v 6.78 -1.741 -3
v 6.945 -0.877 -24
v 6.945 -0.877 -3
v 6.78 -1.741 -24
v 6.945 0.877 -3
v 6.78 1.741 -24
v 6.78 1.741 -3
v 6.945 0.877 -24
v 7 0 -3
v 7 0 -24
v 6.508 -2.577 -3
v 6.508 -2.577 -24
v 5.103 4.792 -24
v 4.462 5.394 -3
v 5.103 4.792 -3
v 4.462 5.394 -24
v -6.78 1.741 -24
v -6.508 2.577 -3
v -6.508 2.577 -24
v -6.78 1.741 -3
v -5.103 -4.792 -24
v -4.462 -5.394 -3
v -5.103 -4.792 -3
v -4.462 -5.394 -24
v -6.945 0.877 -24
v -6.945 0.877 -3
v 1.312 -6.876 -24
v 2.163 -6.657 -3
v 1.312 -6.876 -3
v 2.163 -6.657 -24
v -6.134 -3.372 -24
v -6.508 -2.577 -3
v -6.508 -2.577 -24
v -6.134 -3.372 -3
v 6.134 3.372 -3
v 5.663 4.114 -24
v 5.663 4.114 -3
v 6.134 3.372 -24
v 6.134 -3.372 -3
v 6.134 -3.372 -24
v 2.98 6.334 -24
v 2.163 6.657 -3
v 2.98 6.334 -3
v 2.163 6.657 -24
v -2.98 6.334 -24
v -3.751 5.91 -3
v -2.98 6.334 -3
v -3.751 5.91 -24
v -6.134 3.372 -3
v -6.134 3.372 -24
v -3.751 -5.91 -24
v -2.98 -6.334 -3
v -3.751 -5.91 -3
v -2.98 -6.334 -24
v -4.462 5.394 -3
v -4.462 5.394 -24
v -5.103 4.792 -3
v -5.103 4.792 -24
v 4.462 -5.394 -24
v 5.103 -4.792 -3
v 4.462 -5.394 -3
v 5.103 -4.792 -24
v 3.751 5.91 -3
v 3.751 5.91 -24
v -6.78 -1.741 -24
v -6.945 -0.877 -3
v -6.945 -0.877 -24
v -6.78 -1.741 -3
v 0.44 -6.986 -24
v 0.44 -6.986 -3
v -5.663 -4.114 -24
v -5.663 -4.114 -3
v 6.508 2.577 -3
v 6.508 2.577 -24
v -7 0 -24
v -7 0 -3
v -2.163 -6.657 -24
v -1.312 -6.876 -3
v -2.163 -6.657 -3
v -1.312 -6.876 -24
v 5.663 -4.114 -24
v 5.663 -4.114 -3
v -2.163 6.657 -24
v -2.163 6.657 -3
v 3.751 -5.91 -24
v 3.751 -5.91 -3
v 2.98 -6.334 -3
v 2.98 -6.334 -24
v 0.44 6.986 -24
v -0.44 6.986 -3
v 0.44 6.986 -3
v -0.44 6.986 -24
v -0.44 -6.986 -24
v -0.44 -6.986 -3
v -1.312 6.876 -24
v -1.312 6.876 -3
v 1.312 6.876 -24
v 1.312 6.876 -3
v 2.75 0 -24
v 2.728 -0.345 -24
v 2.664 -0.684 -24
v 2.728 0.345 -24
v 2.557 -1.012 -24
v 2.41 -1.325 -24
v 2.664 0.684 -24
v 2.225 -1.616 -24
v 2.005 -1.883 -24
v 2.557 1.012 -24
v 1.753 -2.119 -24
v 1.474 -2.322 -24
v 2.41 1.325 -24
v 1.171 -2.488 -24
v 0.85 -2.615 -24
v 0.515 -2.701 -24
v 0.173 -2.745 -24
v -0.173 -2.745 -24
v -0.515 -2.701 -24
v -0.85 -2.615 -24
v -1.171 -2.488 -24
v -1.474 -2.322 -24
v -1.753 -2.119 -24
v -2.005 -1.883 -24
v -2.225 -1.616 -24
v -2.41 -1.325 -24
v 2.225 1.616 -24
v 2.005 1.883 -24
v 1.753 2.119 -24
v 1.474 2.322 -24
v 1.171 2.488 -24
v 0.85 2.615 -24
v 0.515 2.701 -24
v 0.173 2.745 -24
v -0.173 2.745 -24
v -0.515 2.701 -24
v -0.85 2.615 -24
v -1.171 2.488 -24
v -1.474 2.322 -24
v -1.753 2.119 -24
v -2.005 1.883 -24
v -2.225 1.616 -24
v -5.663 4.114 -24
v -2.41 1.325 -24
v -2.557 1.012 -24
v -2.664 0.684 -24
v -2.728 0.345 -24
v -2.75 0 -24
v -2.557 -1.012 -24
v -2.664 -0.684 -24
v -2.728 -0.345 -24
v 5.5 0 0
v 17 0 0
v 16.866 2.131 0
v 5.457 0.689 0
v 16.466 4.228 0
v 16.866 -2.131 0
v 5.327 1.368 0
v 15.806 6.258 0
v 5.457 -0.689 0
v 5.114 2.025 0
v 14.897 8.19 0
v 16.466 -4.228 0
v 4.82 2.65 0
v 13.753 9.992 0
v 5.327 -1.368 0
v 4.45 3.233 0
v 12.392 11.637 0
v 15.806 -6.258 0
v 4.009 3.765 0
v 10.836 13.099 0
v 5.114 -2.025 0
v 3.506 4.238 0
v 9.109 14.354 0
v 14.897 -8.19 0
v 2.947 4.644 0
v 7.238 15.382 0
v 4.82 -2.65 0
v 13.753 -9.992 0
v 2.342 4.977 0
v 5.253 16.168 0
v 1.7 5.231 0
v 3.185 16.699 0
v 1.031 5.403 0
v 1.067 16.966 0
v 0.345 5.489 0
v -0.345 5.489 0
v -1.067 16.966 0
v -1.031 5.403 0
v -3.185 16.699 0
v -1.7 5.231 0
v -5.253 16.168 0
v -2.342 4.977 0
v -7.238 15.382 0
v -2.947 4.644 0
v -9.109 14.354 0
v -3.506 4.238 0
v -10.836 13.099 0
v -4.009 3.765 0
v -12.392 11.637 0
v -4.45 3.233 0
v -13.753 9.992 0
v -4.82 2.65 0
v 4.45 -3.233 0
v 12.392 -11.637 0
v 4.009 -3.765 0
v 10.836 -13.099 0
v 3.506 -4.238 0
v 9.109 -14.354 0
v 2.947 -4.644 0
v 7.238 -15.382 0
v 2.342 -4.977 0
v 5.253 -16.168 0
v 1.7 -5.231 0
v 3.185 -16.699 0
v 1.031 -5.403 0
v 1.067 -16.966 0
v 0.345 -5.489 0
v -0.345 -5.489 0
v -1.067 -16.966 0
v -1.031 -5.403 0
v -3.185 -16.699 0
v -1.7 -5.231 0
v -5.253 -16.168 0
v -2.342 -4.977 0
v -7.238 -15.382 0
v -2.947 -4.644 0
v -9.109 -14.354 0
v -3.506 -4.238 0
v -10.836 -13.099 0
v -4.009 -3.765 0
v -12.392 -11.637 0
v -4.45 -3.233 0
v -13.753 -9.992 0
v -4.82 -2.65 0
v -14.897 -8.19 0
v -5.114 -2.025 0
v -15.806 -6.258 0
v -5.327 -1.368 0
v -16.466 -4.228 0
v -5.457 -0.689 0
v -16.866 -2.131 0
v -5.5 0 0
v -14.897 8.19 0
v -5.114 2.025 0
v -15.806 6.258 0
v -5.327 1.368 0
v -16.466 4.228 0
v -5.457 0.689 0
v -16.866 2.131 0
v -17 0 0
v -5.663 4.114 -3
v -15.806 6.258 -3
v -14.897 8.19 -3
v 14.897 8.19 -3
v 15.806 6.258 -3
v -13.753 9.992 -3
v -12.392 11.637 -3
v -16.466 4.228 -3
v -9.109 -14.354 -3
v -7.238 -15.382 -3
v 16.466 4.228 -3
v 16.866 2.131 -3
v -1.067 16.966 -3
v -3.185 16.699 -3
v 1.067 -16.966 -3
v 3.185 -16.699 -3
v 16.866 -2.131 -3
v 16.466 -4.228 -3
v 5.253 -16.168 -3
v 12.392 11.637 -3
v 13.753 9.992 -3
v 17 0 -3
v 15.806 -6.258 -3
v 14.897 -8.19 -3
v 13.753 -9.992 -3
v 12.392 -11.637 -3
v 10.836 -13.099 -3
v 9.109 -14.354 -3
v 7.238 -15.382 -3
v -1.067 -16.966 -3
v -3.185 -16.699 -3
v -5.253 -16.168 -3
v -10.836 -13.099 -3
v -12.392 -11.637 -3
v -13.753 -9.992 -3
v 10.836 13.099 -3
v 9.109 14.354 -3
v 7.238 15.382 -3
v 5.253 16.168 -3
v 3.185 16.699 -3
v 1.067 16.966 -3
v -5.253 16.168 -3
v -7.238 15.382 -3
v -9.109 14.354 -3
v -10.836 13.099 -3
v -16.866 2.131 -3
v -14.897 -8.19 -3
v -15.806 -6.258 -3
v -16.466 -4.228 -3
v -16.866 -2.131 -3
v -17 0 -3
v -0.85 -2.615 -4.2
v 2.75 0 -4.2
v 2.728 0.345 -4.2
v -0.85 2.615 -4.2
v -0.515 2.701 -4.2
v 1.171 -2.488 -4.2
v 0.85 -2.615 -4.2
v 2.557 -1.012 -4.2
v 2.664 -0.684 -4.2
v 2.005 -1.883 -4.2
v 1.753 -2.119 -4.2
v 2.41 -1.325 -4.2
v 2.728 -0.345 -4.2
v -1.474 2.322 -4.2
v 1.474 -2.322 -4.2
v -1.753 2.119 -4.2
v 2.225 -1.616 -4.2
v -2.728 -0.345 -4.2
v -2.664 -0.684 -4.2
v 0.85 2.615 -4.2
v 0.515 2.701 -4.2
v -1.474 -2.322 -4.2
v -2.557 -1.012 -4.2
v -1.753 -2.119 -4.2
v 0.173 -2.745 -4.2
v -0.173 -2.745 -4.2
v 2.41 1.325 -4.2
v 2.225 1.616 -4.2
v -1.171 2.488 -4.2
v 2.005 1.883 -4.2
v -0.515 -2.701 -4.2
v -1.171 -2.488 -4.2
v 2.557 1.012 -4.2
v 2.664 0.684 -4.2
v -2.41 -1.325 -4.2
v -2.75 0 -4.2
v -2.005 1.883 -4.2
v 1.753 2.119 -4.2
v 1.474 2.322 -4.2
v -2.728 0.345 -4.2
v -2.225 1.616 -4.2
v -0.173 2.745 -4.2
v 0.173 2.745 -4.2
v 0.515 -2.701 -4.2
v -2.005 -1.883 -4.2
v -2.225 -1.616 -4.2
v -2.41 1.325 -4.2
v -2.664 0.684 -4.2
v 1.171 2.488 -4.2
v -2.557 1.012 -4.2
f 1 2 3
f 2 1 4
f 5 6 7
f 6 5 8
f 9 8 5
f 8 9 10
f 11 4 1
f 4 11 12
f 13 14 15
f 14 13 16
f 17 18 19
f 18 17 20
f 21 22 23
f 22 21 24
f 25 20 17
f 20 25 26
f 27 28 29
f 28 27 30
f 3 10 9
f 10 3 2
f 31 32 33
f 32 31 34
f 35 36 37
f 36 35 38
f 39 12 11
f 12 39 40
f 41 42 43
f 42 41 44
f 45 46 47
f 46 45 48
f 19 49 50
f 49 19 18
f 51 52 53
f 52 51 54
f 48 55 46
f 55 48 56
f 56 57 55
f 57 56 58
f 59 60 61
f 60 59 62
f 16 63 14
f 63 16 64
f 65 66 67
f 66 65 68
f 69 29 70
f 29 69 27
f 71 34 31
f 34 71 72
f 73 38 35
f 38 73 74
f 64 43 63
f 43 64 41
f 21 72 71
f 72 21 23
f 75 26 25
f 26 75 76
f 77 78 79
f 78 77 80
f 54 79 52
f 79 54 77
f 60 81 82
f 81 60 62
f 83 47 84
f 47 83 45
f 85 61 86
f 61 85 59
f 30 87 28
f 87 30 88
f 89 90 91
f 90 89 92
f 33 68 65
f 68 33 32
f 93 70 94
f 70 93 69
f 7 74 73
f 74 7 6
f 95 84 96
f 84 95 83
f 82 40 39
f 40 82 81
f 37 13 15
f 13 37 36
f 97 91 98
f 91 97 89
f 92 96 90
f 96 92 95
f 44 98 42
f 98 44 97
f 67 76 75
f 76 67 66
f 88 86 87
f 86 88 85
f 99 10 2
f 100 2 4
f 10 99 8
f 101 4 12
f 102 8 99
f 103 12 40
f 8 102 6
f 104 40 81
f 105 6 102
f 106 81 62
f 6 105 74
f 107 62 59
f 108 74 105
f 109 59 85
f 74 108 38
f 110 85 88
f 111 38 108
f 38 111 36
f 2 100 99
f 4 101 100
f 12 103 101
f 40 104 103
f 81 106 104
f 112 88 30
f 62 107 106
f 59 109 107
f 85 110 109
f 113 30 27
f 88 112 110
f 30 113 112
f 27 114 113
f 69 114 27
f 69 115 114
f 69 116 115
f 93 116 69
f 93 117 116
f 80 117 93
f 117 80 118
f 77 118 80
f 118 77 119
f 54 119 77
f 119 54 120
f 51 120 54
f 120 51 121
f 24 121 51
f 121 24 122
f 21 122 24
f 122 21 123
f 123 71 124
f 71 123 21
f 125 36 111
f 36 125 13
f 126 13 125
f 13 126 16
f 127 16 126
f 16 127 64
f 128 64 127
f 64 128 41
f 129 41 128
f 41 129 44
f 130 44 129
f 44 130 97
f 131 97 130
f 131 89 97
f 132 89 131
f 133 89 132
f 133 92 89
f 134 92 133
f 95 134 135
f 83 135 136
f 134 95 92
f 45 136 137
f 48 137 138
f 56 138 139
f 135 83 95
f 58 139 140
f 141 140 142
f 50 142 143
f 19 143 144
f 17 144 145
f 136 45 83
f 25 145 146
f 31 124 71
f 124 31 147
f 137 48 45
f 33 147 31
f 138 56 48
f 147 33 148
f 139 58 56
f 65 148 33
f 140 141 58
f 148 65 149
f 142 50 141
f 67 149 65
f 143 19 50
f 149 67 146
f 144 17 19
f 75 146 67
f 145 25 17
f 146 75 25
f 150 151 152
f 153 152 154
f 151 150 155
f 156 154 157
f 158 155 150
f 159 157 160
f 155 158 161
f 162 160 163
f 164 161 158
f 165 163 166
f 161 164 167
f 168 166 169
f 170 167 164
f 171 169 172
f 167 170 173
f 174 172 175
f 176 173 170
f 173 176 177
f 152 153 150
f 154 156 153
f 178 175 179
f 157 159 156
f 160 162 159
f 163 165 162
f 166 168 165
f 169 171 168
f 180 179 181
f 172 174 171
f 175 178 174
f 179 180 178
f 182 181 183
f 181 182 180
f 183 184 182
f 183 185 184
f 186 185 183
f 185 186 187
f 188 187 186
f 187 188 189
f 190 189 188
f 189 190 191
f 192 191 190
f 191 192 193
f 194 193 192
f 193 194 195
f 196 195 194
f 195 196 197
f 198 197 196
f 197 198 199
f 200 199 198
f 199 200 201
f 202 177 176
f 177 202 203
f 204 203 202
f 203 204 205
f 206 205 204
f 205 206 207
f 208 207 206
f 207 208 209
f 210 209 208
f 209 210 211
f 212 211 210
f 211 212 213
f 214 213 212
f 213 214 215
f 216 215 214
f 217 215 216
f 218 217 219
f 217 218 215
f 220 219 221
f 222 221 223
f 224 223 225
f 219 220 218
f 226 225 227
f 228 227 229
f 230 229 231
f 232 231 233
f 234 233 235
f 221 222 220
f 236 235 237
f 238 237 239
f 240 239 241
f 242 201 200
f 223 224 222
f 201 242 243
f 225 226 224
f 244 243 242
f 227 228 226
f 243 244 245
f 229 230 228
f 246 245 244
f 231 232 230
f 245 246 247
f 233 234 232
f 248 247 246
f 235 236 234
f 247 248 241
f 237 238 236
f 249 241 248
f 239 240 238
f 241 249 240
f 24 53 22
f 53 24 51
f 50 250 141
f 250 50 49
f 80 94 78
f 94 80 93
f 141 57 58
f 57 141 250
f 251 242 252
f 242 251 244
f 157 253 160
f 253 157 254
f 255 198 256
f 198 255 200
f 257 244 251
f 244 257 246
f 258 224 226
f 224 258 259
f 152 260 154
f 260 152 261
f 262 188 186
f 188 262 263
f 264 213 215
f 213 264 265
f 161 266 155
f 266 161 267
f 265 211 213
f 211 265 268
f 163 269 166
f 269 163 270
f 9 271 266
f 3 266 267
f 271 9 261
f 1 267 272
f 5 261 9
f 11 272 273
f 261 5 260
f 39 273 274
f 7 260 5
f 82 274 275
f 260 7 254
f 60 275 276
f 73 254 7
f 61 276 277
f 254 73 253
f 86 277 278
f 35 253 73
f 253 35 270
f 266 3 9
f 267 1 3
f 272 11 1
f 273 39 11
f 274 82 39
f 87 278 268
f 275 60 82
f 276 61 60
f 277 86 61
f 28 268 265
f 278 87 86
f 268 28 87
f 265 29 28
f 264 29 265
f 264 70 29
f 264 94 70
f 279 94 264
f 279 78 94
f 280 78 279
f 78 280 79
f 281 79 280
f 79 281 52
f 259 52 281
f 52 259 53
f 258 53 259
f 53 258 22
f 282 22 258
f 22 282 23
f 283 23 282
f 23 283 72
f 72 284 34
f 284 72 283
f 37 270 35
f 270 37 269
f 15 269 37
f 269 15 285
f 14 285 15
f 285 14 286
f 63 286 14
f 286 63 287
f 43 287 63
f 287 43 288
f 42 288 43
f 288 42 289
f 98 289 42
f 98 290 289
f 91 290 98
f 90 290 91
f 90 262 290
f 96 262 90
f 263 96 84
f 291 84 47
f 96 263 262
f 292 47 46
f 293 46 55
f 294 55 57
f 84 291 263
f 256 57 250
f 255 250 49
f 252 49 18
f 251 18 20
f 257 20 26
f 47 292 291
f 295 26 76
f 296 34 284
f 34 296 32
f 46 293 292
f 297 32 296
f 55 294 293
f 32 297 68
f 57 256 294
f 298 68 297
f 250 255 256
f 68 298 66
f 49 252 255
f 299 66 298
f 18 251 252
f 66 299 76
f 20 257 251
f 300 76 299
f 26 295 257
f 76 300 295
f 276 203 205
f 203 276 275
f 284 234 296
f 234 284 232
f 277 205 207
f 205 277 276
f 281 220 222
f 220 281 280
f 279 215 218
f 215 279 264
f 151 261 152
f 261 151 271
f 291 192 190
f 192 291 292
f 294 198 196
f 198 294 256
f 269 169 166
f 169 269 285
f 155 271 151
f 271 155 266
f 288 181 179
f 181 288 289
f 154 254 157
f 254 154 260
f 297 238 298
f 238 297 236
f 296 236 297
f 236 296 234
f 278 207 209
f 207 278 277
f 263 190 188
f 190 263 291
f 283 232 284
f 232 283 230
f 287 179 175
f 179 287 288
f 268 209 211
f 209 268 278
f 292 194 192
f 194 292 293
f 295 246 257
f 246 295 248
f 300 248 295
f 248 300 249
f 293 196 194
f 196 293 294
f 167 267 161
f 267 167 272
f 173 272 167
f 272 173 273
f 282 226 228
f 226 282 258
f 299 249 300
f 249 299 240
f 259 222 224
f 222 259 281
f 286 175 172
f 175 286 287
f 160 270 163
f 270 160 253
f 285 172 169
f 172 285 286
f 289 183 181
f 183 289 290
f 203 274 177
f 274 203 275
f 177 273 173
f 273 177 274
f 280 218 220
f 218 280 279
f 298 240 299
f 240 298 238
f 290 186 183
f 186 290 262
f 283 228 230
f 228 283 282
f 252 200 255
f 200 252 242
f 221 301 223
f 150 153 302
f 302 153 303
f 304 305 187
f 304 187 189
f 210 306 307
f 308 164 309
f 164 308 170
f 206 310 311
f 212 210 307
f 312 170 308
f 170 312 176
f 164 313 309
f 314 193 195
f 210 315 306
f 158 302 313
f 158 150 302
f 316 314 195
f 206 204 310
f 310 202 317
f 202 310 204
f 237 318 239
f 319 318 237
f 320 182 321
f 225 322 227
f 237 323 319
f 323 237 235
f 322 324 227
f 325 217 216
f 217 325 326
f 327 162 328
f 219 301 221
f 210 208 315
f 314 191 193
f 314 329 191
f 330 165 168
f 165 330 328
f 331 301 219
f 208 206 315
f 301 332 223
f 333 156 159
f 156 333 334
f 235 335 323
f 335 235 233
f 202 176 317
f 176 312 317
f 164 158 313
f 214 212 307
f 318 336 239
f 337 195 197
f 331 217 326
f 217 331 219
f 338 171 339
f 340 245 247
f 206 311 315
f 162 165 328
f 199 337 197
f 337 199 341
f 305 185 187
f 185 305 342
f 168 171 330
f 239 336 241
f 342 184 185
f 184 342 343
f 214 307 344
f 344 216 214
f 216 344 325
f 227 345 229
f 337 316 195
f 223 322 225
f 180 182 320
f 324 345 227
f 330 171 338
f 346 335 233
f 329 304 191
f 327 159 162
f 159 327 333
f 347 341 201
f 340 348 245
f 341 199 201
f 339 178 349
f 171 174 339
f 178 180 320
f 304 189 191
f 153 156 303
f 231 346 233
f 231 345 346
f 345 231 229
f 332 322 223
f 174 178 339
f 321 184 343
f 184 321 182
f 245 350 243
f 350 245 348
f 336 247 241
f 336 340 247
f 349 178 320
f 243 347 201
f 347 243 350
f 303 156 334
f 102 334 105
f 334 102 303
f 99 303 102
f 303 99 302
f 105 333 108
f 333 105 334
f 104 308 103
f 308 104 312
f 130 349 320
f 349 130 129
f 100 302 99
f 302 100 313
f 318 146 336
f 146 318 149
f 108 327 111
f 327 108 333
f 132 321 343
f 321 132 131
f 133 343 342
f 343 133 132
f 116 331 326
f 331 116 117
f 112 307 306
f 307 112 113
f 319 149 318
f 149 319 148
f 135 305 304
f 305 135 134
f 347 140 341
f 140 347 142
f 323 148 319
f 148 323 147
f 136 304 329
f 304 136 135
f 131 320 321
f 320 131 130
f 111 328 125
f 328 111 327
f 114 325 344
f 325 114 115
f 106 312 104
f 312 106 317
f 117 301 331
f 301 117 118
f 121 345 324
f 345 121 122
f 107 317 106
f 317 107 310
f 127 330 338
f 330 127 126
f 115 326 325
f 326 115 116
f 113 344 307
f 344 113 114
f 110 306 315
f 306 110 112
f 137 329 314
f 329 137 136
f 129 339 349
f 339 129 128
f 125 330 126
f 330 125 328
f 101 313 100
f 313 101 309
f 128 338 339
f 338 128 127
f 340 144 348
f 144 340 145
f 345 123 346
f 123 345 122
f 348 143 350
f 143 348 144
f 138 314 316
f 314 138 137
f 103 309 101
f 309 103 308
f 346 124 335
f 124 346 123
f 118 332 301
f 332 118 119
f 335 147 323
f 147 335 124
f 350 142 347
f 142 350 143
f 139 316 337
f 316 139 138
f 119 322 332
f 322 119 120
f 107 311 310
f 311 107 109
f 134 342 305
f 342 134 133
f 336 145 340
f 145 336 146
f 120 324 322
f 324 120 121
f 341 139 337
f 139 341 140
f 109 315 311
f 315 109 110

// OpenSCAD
$fn = 50;


difference() {
	union() {
		translate(v = [0, 0, -24.0000000000]) {
			cylinder(h = 24, r = 7.0000000000);
		}
		translate(v = [0, 0, -3.0000000000]) {
			cylinder(h = 3, r = 17.0000000000);
		}
	}
	union() {
		translate(v = [0, 0, 0]) {
			rotate(a = [0, 0, 0]) {
				difference() {
					union() {
						#translate(v = [0, 0, -24.0000000000]) {
							cylinder(h = 24, r = 2.2500000000);
						}
						#translate(v = [0, 0, -4.2000000000]) {
							cylinder(h = 4.2000000000, r1 = 2.7500000000, r2 = 5.5000000000);
						}
						#translate(v = [0, 0, -24.0000000000]) {
							cylinder(h = 24, r = 2.7500000000);
						}
						#translate(v = [0, 0, -24.0000000000]) {
							cylinder(h = 24, r = 2.2500000000);
						}
					}
					union();
				}
			}
		}
	}
}
